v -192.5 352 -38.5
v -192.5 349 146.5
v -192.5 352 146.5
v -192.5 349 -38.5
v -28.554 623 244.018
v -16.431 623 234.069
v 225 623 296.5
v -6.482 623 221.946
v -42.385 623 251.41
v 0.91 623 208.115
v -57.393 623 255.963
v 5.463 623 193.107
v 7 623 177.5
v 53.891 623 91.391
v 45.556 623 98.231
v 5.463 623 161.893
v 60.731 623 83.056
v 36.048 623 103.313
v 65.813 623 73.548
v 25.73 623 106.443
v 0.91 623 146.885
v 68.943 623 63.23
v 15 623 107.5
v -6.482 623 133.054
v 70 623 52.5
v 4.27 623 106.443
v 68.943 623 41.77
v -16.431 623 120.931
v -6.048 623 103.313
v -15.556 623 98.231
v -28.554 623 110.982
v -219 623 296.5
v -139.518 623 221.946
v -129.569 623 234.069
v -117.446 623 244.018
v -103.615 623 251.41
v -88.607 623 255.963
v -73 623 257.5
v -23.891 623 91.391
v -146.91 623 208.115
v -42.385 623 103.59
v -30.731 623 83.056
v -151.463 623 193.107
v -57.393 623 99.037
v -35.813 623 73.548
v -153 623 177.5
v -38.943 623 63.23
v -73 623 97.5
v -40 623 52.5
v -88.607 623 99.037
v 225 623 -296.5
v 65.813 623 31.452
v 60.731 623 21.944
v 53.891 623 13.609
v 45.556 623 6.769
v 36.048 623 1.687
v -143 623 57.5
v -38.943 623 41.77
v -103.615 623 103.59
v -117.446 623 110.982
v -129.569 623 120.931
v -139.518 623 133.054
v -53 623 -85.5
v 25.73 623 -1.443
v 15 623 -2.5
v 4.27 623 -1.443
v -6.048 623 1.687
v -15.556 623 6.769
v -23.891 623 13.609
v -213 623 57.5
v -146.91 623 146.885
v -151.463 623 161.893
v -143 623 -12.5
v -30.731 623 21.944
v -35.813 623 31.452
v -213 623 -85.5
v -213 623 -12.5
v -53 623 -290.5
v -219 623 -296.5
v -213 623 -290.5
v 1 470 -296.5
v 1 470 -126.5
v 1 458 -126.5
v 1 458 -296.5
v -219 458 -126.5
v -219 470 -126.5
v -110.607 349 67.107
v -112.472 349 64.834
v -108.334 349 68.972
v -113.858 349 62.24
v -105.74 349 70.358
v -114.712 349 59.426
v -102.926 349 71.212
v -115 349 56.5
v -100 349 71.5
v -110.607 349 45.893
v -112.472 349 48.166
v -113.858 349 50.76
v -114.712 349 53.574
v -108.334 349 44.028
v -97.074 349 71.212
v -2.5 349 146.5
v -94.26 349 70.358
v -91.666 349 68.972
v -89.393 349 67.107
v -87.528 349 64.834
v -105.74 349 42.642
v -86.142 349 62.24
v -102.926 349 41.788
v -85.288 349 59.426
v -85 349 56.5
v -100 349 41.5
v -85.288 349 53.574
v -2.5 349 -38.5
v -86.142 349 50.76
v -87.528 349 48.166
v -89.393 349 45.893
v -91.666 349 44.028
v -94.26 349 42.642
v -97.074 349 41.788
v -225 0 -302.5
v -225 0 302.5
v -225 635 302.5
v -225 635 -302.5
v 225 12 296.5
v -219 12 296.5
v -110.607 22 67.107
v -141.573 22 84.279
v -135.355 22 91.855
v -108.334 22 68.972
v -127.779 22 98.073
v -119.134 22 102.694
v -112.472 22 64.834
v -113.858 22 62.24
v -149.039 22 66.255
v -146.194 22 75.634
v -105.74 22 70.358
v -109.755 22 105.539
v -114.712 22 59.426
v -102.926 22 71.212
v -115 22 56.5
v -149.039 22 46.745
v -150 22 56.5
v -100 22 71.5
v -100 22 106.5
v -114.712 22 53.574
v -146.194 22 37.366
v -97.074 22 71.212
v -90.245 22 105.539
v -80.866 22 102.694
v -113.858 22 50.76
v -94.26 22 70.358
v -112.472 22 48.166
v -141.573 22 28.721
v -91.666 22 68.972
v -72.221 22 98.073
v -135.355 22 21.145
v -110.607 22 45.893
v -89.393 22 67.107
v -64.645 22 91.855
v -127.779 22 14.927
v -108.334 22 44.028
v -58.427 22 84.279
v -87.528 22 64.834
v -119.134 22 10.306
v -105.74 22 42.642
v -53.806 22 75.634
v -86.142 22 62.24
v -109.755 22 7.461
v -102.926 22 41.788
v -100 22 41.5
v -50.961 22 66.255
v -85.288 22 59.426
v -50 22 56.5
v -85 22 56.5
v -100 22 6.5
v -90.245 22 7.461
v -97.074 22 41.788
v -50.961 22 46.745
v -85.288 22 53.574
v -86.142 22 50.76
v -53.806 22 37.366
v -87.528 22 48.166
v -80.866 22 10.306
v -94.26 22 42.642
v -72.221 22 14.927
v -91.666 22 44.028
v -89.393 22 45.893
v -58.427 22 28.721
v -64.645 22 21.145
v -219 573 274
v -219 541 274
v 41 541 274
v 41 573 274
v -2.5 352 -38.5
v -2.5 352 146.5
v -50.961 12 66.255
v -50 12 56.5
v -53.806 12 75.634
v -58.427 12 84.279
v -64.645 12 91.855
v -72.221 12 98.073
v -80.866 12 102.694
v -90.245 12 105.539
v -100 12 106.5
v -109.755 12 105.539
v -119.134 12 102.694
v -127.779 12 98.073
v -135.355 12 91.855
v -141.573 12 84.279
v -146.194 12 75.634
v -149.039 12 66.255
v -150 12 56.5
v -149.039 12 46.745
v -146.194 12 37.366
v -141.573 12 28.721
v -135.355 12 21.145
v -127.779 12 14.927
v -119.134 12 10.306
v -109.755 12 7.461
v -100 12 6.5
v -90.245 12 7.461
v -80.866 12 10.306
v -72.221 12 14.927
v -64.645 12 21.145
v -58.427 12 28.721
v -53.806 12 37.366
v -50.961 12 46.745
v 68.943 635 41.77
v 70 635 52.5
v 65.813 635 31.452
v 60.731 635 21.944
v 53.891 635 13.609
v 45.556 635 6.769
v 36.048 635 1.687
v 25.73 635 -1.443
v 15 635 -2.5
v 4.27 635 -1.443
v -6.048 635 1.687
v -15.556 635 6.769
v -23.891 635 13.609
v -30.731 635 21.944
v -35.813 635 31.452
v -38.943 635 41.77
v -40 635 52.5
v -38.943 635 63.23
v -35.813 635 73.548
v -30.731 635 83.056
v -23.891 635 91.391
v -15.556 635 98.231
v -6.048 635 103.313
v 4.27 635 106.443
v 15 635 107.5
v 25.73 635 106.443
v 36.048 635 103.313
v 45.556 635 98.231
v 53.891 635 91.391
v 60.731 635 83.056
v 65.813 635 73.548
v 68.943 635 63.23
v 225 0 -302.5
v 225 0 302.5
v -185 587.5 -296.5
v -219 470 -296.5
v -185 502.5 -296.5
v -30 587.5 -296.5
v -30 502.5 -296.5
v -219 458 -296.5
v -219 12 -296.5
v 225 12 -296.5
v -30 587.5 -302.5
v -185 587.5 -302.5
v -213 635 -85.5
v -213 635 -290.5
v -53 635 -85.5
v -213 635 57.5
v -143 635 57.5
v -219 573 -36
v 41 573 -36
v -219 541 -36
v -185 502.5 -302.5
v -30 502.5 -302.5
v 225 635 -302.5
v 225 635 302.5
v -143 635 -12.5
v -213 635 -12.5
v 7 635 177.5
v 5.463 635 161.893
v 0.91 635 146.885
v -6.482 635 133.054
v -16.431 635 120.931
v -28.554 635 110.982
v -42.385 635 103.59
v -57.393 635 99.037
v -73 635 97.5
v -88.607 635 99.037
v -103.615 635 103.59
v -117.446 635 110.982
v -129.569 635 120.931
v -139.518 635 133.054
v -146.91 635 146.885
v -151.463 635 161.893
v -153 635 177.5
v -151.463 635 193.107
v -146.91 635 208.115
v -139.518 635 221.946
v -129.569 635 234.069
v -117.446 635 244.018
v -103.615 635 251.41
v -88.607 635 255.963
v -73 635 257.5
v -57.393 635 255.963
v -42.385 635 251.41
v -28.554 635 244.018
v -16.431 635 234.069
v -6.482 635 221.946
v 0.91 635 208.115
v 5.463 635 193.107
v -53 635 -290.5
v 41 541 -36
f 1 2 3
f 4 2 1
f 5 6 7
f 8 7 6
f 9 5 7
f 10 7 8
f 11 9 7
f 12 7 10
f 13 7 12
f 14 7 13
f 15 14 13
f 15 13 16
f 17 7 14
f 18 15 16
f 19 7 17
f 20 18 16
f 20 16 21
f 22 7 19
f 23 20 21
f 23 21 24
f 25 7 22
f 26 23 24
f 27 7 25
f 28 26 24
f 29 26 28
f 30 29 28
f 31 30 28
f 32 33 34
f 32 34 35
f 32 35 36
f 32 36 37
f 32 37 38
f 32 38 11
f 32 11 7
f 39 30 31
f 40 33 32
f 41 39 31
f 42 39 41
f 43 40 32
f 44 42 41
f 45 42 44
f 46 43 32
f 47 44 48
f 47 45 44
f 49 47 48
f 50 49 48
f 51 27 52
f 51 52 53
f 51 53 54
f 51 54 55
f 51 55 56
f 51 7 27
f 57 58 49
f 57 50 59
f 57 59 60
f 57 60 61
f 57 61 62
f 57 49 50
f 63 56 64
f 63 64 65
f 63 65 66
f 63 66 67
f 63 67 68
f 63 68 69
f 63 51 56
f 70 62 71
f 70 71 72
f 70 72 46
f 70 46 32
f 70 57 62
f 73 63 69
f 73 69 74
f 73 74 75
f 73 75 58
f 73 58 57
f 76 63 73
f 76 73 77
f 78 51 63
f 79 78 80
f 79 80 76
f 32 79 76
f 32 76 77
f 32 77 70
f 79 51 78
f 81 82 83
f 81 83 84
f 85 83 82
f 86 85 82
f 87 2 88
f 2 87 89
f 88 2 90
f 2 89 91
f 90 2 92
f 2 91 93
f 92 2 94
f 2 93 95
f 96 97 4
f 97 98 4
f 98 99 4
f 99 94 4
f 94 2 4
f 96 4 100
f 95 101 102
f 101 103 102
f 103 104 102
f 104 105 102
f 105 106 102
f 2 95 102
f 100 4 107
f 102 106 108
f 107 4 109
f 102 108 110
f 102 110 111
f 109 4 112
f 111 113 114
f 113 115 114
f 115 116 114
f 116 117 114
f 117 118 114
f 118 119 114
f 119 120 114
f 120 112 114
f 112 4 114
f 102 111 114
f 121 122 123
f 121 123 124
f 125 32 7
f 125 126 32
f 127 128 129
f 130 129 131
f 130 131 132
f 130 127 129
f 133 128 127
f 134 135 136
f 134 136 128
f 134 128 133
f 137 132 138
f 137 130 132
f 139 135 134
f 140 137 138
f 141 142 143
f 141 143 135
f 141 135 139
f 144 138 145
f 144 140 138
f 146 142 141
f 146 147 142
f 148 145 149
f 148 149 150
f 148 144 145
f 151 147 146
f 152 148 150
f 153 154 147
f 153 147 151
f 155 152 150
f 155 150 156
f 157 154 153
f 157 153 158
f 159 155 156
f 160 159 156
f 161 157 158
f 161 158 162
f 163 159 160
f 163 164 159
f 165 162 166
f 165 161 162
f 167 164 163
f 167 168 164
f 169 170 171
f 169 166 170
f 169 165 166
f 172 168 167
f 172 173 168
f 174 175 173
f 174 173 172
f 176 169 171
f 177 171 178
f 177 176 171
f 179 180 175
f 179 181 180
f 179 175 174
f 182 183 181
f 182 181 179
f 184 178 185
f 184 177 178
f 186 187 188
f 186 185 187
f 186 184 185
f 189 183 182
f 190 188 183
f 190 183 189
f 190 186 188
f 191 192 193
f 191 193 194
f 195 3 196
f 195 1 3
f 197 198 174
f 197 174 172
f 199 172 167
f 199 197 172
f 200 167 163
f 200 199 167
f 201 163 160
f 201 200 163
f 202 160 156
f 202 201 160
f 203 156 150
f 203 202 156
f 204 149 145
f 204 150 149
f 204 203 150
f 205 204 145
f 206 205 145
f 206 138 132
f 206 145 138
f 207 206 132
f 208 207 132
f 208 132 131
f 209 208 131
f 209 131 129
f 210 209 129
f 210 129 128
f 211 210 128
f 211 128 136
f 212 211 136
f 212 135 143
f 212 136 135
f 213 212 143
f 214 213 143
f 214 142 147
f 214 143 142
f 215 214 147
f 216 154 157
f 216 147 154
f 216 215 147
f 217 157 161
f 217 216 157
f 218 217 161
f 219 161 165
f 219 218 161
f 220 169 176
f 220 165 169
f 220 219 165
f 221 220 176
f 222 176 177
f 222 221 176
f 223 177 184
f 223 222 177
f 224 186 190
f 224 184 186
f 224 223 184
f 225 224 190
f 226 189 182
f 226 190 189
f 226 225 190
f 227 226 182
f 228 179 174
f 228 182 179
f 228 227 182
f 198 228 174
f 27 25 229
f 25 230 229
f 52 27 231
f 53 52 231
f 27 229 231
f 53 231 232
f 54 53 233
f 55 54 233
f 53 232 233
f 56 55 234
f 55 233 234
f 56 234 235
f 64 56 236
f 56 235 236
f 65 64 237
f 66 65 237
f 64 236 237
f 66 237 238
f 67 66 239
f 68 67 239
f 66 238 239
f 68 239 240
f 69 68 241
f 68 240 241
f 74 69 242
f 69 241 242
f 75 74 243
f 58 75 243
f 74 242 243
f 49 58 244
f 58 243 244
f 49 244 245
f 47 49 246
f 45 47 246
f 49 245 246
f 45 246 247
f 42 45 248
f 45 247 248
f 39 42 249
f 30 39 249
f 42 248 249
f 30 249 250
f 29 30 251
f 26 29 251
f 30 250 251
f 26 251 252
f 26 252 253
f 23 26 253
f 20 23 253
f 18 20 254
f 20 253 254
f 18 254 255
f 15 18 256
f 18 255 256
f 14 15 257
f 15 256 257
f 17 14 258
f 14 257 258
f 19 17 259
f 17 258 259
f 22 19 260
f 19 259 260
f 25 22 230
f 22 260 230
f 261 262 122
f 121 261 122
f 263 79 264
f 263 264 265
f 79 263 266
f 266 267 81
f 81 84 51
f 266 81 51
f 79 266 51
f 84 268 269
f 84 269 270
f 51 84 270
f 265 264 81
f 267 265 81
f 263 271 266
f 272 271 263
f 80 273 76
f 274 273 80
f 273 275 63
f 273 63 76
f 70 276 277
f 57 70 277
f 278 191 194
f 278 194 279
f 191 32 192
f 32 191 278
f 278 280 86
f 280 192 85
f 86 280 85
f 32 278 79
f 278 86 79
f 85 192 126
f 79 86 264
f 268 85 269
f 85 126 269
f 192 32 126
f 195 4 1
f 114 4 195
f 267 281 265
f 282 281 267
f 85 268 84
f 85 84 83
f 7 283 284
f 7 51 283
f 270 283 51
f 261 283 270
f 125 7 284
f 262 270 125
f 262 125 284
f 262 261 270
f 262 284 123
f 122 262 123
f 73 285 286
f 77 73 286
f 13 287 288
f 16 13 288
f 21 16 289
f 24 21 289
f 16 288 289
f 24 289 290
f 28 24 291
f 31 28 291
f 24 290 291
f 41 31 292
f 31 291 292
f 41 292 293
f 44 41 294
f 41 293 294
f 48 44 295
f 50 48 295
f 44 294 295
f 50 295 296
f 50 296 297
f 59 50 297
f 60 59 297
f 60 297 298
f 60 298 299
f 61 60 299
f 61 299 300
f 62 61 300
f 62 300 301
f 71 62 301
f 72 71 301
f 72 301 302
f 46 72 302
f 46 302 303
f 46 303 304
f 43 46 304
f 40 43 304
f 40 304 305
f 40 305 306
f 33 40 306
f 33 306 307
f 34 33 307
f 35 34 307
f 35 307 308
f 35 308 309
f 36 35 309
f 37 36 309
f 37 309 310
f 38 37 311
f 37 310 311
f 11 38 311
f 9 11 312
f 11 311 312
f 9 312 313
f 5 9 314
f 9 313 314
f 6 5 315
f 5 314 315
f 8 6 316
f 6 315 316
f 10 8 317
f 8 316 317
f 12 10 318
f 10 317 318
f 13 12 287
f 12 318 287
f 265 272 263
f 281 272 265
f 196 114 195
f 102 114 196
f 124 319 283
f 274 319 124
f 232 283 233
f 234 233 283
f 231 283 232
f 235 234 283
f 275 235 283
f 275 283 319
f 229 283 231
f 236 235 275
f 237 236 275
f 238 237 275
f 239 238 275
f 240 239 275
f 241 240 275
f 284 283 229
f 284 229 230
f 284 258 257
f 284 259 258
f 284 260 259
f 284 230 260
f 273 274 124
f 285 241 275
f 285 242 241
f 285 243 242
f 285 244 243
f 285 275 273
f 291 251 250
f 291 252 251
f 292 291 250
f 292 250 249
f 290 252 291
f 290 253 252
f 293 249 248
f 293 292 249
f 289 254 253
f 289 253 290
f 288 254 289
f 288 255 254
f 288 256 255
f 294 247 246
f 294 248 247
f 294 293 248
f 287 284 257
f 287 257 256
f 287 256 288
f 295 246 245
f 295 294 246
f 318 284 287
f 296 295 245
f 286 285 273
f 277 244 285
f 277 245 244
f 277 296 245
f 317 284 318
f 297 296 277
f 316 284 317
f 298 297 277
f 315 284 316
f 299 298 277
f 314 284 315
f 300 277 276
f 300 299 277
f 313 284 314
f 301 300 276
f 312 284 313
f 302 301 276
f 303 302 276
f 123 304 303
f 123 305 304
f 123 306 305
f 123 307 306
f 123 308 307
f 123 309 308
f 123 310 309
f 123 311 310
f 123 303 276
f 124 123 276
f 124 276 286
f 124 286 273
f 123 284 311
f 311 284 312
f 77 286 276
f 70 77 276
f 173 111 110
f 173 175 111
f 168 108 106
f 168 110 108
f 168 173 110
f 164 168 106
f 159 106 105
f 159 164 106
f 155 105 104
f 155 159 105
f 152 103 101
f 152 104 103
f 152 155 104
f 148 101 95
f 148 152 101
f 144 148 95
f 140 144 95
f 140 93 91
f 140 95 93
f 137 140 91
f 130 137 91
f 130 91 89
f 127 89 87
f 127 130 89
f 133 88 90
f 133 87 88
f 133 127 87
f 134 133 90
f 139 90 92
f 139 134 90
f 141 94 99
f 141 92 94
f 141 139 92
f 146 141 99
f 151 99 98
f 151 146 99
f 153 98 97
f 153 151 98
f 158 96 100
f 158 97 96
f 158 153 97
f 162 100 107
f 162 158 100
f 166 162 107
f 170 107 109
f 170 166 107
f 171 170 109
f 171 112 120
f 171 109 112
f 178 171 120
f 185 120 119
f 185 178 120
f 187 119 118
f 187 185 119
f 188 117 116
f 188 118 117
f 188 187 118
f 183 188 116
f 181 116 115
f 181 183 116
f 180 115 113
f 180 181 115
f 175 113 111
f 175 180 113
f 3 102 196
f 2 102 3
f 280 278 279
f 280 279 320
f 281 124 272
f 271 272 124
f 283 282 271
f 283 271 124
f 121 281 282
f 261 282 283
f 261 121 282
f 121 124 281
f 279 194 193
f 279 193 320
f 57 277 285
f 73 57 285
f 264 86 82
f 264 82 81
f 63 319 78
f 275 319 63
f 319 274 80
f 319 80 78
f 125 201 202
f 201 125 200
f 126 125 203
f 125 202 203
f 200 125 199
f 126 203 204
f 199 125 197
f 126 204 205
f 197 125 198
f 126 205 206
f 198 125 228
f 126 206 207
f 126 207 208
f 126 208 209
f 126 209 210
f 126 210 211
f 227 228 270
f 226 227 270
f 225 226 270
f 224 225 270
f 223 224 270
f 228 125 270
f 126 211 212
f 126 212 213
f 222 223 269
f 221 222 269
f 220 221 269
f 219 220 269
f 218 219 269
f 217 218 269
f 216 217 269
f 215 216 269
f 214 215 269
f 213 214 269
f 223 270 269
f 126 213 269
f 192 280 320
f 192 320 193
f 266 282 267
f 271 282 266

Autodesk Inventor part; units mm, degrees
ref_plane "YZ Plane" through (0, 0, 0) normal (1, 0, 0) x (0, 1, 0)
ref_plane "XZ Plane" through (0, 0, 0) normal (0, 1, 0) x (-1, 0, 0)
ref_plane "XY Plane" through (0, 0, 0) normal (0, 0, 1) x (1, 0, 0)
sketch "Sketch1" plane through (0, 0, 0) normal (0, 1, 0) x (-1, 0, 0)
  line L0 (-225, 302.5) -> (225, 302.5)
  line L1 (225, 302.5) -> (225, -302.5)
  line L2 (225, -302.5) -> (-225, -302.5)
  line L3 (-225, -302.5) -> (-225, 302.5)
  line L4 (-225, 302.5) -> (225, -302.5) construction
  line L5 (225, 302.5) -> (-225, -302.5) construction
  line L6 (-219, 296.5) -> (219, 296.5)
  line L7 (219, 296.5) -> (219, -296.5)
  line L8 (219, -296.5) -> (-219, -296.5)
  line L9 (-219, -296.5) -> (-219, 296.5)
  line L10 (-219, 296.5) -> (219, -296.5) construction
  line L11 (219, 296.5) -> (-219, -296.5) construction
  line L12 (-219, 296.5) -> (-225, 296.5)
  line L13 (-219, 296.5) -> (-213, 296.5) construction
  line L14 (-219, -296.5) -> (-225, -296.5)
  line L15 (-219, -296.5) -> (-213, -296.5) construction
  point P0 (0, 0)
  dimension "d0" = 450
  dimension "d1" = 605
  dimension "d2" = 438
  dimension "d3" = 593
  dimension "d4" = 6
  dimension "d5" = 180
  dimension "d6" = 6
  dimension "d7" = 180
extrude "Extrusion1" add sketch "Sketch1" along normal blind 635 contours L0 L1 L2 L3 L14 L8 L7 L6 L12
sketch "Sketch2" plane through (-219, 0, -296.5) normal (0, 0, 1) x (1, 0, 0)
  line L0 (0, 635) -> (444, 635) projected
  line L1 (444, 0) -> (444, 635) projected
  line L2 (0, 635) -> (444, 635)
  line L3 (444, 635) -> (444, 623)
  line L4 (444, 623) -> (0, 623)
  line L5 (0, 623) -> (0, 635)
  line L6 (0, 0) -> (444, 0)
  line L7 (444, 0) -> (444, 12)
  line L8 (444, 12) -> (0, 12)
  line L9 (0, 12) -> (0, 0)
  point P0 (219, 0)
  dimension "d10" = 12
  dimension "d13" = 12
extrude "Extrusion2" add sketch "Sketch2" along normal up to surface (593 mm away)
sketch "Sketch3" plane through (0, 635, 0) normal (0, 1, 0) x (1, 0, 0)
  circle A0 centre (-73, -177.5) radius 80
  line L0 (-225, 302.5) -> (-225, -302.5) projected
  line L1 (-225, -302.5) -> (225, -302.5) projected
  circle A1 centre (-125, 202.5) radius 37.5
  line L2 (225, 302.5) -> (-225, 302.5) projected
  line L3 (-213, -57.5) -> (-143, -57.5)
  line L4 (-143, -57.5) -> (-143, 12.5)
  line L5 (-143, 12.5) -> (-213, 12.5)
  line L6 (-213, 12.5) -> (-213, -57.5)
  line L7 (-213, -57.5) -> (-143, 12.5) construction
  line L8 (-143, -57.5) -> (-213, 12.5) construction
  circle A2 centre (15, -52.5) radius 55
  line L9 (225, -302.5) -> (225, 302.5) projected
  line L10 (-53, 85.5) -> (-213, 85.5)
  line L11 (-213, 85.5) -> (-213, 290.5)
  line L12 (-213, 290.5) -> (-53, 290.5)
  line L13 (-53, 290.5) -> (-53, 85.5)
  line L14 (-53, 85.5) -> (-213, 290.5) construction
  line L15 (-213, 85.5) -> (-53, 290.5) construction
  point P0 (0, 0)
  point P1 (-178, -22.5)
  point P2 (-133, 188)
  dimension "d14" = 160
  dimension "d15" = 152
  dimension "d16" = 125
  dimension "d17" = 75
  dimension "d18" = 100
  dimension "d19" = 100
  dimension "d20" = 325
  dimension "d21" = 47
  dimension "d22" = 70
  dimension "d23" = 70
  dimension "d24" = 110
  dimension "d25" = 210
  dimension "d26" = 250
  dimension "d37" = 205
  dimension "d38" = 160
  dimension "d39" = 12
  dimension "d40" = 12
extrude "Extrusion3" cut sketch "Sketch3" against normal blind 100 contours A0 | A1 | L6 L5 L4 L3 | A2 | L10 L11 L12 L13
sketch "Sketch4" plane through (225, 0, -302.5) normal (0, 0, -1) x (-1, 0, 0)
  line L0 (255, 587.5) -> (410, 587.5)
  line L1 (410, 587.5) -> (410, 502.5)
  line L2 (410, 502.5) -> (255, 502.5)
  line L3 (255, 502.5) -> (255, 587.5)
  line L4 (255, 587.5) -> (410, 502.5) construction
  line L5 (410, 587.5) -> (255, 502.5) construction
  line L6 (450, 0) -> (450, 635) projected
  line L7 (0, 635) -> (450, 635) projected
  point P0 (225, 0)
  point P1 (332.5, 545)
  dimension "d31" = 155
  dimension "d32" = 85
  dimension "d33" = 40
  dimension "d34" = 90
extrude "Extrusion4" cut sketch "Sketch4" against normal blind 100
sketch "Sketch5" plane through (-219, 12, 296.5) normal (1, 0, 0) x (0, 0, -1)
  line L0 (22.5, 561) -> (332.5, 561)
  line L1 (332.5, 561) -> (332.5, 529)
  line L2 (332.5, 529) -> (22.5, 529)
  line L3 (22.5, 529) -> (22.5, 561)
  line L4 (22.5, 561) -> (332.5, 529) construction
  line L5 (332.5, 561) -> (22.5, 529) construction
  line L6 (0, 0) -> (0, 611) projected
  line L7 (593, 611) -> (0, 611) projected
  point P0 (296.5, -12)
  point P1 (177.5, 545)
  dimension "d41" = 22.5
  dimension "d42" = 310
  dimension "d43" = 32
  dimension "d44" = 82
extrude "Extrusion5" add sketch "Sketch5" along normal blind 260
sketch "Sketch6" plane through (-219, 12, 296.5) normal (1, 0, 0) x (0, 0, -1)
  line L0 (423, 458) -> (593, 458)
  line L1 (593, 458) -> (593, 446)
  line L2 (593, 446) -> (423, 446)
  line L3 (423, 446) -> (423, 458)
  line L4 (423, 458) -> (593, 446) construction
  line L5 (593, 458) -> (423, 446) construction
  line L6 (593, 611) -> (0, 611) projected
  line L7 (593, 0) -> (593, 611) projected
  point P0 (296.5, -12)
  point P1 (508, 452)
  dimension "d47" = 170
  dimension "d48" = 12
  dimension "d49" = 165
  dimension "d50" = 0
extrude "Extrusion6" add sketch "Sketch6" along normal blind 220
sketch "Sketch7" plane through (-219, 12, -296.5) normal (0, 1, 0) x (1, 0, 0)
  circle A0 centre (119, -353) radius 50
  line L0 (444, 0) -> (444, -593) projected
  line L1 (444, -593) -> (0, -593) projected
  point P0 (219, -296.5)
  dimension "d53" = 100
  dimension "d54" = 325
  dimension "d55" = 240
extrude "Extrusion7" add sketch "Sketch7" along normal blind 10
sketch "Sketch8" plane through (-100, 22, 56.5) normal (0, 1, 0) x (1, 0, 0)
  circle A0 centre (0, 0) radius 15
  point P0 (100, 56.5)
  dimension "d58" = 30
extrude "Extrusion8" add sketch "Sketch8" along normal blind 327
sketch "Sketch9" plane through (-100, 349, 56.5) normal (0, 1, 0) x (1, 0, 0)
  line L0 (97.5, -90) -> (-92.5, -90)
  line L1 (-92.5, -90) -> (-92.5, 95)
  line L2 (-92.5, 95) -> (97.5, 95)
  line L3 (97.5, 95) -> (97.5, -90)
  line L4 (97.5, -90) -> (-92.5, 95) construction
  line L5 (-92.5, -90) -> (97.5, 95) construction
  point P0 (100, 56.5)
  point P1 (2.5, 2.5)
  dimension "d61" = 190
  dimension "d62" = 185
extrude "Extrusion9" add sketch "Sketch9" along normal blind 3
properties part number "Outer Casing"
